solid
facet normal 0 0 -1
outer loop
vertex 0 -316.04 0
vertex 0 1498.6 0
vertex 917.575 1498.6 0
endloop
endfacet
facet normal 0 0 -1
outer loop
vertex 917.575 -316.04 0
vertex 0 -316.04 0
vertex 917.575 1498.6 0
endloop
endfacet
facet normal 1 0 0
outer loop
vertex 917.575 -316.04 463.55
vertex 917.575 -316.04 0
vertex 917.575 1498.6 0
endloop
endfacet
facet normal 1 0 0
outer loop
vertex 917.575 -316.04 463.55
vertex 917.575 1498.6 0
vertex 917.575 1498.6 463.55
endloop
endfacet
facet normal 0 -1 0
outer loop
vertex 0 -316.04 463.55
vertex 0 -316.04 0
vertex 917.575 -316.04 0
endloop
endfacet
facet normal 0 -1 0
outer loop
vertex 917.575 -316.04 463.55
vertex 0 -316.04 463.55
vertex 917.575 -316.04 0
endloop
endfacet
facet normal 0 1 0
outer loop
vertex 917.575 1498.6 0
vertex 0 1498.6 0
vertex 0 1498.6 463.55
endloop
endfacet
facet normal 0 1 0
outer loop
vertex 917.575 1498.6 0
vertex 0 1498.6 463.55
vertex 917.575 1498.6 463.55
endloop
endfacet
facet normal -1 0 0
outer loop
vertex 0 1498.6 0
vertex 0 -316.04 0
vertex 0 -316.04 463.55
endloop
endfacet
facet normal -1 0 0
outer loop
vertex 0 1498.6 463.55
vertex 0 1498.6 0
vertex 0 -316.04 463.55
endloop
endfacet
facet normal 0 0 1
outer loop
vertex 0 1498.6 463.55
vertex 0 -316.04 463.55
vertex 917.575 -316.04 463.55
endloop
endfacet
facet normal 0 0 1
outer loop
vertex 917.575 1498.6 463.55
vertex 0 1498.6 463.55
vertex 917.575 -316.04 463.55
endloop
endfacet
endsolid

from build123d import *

# Parameters (mm, degrees)
F0_W     = 917.575
F0_H     = 1498.6
F1_DEPTH = 463.55
F2_DEPTH = 474.98
F3_DEPTH = 158.9405


with BuildPart() as f1:
    # F0 (on Top) → F1 (new body)
    with BuildSketch(Plane.XY):
        with Locations((458.7875, 749.3)):
            Rectangle(F0_W, F0_H)
    extrude(amount=F1_DEPTH)

    # F2 (add): a face of the model
    f2_faces = [f1.faces().sort_by_distance(p)[0] for p in [
        (458.7875, 0, 231.775),
    ]]
    extrude(f2_faces, amount=F2_DEPTH)

    # F3 (cut): a face of the model
    f3_faces = [f1.faces().sort_by_distance(p)[0] for p in [
        (458.7875, -474.98, 231.775),
    ]]
    extrude(f3_faces, amount=-F3_DEPTH, mode=Mode.SUBTRACT)


solid = f1.part
